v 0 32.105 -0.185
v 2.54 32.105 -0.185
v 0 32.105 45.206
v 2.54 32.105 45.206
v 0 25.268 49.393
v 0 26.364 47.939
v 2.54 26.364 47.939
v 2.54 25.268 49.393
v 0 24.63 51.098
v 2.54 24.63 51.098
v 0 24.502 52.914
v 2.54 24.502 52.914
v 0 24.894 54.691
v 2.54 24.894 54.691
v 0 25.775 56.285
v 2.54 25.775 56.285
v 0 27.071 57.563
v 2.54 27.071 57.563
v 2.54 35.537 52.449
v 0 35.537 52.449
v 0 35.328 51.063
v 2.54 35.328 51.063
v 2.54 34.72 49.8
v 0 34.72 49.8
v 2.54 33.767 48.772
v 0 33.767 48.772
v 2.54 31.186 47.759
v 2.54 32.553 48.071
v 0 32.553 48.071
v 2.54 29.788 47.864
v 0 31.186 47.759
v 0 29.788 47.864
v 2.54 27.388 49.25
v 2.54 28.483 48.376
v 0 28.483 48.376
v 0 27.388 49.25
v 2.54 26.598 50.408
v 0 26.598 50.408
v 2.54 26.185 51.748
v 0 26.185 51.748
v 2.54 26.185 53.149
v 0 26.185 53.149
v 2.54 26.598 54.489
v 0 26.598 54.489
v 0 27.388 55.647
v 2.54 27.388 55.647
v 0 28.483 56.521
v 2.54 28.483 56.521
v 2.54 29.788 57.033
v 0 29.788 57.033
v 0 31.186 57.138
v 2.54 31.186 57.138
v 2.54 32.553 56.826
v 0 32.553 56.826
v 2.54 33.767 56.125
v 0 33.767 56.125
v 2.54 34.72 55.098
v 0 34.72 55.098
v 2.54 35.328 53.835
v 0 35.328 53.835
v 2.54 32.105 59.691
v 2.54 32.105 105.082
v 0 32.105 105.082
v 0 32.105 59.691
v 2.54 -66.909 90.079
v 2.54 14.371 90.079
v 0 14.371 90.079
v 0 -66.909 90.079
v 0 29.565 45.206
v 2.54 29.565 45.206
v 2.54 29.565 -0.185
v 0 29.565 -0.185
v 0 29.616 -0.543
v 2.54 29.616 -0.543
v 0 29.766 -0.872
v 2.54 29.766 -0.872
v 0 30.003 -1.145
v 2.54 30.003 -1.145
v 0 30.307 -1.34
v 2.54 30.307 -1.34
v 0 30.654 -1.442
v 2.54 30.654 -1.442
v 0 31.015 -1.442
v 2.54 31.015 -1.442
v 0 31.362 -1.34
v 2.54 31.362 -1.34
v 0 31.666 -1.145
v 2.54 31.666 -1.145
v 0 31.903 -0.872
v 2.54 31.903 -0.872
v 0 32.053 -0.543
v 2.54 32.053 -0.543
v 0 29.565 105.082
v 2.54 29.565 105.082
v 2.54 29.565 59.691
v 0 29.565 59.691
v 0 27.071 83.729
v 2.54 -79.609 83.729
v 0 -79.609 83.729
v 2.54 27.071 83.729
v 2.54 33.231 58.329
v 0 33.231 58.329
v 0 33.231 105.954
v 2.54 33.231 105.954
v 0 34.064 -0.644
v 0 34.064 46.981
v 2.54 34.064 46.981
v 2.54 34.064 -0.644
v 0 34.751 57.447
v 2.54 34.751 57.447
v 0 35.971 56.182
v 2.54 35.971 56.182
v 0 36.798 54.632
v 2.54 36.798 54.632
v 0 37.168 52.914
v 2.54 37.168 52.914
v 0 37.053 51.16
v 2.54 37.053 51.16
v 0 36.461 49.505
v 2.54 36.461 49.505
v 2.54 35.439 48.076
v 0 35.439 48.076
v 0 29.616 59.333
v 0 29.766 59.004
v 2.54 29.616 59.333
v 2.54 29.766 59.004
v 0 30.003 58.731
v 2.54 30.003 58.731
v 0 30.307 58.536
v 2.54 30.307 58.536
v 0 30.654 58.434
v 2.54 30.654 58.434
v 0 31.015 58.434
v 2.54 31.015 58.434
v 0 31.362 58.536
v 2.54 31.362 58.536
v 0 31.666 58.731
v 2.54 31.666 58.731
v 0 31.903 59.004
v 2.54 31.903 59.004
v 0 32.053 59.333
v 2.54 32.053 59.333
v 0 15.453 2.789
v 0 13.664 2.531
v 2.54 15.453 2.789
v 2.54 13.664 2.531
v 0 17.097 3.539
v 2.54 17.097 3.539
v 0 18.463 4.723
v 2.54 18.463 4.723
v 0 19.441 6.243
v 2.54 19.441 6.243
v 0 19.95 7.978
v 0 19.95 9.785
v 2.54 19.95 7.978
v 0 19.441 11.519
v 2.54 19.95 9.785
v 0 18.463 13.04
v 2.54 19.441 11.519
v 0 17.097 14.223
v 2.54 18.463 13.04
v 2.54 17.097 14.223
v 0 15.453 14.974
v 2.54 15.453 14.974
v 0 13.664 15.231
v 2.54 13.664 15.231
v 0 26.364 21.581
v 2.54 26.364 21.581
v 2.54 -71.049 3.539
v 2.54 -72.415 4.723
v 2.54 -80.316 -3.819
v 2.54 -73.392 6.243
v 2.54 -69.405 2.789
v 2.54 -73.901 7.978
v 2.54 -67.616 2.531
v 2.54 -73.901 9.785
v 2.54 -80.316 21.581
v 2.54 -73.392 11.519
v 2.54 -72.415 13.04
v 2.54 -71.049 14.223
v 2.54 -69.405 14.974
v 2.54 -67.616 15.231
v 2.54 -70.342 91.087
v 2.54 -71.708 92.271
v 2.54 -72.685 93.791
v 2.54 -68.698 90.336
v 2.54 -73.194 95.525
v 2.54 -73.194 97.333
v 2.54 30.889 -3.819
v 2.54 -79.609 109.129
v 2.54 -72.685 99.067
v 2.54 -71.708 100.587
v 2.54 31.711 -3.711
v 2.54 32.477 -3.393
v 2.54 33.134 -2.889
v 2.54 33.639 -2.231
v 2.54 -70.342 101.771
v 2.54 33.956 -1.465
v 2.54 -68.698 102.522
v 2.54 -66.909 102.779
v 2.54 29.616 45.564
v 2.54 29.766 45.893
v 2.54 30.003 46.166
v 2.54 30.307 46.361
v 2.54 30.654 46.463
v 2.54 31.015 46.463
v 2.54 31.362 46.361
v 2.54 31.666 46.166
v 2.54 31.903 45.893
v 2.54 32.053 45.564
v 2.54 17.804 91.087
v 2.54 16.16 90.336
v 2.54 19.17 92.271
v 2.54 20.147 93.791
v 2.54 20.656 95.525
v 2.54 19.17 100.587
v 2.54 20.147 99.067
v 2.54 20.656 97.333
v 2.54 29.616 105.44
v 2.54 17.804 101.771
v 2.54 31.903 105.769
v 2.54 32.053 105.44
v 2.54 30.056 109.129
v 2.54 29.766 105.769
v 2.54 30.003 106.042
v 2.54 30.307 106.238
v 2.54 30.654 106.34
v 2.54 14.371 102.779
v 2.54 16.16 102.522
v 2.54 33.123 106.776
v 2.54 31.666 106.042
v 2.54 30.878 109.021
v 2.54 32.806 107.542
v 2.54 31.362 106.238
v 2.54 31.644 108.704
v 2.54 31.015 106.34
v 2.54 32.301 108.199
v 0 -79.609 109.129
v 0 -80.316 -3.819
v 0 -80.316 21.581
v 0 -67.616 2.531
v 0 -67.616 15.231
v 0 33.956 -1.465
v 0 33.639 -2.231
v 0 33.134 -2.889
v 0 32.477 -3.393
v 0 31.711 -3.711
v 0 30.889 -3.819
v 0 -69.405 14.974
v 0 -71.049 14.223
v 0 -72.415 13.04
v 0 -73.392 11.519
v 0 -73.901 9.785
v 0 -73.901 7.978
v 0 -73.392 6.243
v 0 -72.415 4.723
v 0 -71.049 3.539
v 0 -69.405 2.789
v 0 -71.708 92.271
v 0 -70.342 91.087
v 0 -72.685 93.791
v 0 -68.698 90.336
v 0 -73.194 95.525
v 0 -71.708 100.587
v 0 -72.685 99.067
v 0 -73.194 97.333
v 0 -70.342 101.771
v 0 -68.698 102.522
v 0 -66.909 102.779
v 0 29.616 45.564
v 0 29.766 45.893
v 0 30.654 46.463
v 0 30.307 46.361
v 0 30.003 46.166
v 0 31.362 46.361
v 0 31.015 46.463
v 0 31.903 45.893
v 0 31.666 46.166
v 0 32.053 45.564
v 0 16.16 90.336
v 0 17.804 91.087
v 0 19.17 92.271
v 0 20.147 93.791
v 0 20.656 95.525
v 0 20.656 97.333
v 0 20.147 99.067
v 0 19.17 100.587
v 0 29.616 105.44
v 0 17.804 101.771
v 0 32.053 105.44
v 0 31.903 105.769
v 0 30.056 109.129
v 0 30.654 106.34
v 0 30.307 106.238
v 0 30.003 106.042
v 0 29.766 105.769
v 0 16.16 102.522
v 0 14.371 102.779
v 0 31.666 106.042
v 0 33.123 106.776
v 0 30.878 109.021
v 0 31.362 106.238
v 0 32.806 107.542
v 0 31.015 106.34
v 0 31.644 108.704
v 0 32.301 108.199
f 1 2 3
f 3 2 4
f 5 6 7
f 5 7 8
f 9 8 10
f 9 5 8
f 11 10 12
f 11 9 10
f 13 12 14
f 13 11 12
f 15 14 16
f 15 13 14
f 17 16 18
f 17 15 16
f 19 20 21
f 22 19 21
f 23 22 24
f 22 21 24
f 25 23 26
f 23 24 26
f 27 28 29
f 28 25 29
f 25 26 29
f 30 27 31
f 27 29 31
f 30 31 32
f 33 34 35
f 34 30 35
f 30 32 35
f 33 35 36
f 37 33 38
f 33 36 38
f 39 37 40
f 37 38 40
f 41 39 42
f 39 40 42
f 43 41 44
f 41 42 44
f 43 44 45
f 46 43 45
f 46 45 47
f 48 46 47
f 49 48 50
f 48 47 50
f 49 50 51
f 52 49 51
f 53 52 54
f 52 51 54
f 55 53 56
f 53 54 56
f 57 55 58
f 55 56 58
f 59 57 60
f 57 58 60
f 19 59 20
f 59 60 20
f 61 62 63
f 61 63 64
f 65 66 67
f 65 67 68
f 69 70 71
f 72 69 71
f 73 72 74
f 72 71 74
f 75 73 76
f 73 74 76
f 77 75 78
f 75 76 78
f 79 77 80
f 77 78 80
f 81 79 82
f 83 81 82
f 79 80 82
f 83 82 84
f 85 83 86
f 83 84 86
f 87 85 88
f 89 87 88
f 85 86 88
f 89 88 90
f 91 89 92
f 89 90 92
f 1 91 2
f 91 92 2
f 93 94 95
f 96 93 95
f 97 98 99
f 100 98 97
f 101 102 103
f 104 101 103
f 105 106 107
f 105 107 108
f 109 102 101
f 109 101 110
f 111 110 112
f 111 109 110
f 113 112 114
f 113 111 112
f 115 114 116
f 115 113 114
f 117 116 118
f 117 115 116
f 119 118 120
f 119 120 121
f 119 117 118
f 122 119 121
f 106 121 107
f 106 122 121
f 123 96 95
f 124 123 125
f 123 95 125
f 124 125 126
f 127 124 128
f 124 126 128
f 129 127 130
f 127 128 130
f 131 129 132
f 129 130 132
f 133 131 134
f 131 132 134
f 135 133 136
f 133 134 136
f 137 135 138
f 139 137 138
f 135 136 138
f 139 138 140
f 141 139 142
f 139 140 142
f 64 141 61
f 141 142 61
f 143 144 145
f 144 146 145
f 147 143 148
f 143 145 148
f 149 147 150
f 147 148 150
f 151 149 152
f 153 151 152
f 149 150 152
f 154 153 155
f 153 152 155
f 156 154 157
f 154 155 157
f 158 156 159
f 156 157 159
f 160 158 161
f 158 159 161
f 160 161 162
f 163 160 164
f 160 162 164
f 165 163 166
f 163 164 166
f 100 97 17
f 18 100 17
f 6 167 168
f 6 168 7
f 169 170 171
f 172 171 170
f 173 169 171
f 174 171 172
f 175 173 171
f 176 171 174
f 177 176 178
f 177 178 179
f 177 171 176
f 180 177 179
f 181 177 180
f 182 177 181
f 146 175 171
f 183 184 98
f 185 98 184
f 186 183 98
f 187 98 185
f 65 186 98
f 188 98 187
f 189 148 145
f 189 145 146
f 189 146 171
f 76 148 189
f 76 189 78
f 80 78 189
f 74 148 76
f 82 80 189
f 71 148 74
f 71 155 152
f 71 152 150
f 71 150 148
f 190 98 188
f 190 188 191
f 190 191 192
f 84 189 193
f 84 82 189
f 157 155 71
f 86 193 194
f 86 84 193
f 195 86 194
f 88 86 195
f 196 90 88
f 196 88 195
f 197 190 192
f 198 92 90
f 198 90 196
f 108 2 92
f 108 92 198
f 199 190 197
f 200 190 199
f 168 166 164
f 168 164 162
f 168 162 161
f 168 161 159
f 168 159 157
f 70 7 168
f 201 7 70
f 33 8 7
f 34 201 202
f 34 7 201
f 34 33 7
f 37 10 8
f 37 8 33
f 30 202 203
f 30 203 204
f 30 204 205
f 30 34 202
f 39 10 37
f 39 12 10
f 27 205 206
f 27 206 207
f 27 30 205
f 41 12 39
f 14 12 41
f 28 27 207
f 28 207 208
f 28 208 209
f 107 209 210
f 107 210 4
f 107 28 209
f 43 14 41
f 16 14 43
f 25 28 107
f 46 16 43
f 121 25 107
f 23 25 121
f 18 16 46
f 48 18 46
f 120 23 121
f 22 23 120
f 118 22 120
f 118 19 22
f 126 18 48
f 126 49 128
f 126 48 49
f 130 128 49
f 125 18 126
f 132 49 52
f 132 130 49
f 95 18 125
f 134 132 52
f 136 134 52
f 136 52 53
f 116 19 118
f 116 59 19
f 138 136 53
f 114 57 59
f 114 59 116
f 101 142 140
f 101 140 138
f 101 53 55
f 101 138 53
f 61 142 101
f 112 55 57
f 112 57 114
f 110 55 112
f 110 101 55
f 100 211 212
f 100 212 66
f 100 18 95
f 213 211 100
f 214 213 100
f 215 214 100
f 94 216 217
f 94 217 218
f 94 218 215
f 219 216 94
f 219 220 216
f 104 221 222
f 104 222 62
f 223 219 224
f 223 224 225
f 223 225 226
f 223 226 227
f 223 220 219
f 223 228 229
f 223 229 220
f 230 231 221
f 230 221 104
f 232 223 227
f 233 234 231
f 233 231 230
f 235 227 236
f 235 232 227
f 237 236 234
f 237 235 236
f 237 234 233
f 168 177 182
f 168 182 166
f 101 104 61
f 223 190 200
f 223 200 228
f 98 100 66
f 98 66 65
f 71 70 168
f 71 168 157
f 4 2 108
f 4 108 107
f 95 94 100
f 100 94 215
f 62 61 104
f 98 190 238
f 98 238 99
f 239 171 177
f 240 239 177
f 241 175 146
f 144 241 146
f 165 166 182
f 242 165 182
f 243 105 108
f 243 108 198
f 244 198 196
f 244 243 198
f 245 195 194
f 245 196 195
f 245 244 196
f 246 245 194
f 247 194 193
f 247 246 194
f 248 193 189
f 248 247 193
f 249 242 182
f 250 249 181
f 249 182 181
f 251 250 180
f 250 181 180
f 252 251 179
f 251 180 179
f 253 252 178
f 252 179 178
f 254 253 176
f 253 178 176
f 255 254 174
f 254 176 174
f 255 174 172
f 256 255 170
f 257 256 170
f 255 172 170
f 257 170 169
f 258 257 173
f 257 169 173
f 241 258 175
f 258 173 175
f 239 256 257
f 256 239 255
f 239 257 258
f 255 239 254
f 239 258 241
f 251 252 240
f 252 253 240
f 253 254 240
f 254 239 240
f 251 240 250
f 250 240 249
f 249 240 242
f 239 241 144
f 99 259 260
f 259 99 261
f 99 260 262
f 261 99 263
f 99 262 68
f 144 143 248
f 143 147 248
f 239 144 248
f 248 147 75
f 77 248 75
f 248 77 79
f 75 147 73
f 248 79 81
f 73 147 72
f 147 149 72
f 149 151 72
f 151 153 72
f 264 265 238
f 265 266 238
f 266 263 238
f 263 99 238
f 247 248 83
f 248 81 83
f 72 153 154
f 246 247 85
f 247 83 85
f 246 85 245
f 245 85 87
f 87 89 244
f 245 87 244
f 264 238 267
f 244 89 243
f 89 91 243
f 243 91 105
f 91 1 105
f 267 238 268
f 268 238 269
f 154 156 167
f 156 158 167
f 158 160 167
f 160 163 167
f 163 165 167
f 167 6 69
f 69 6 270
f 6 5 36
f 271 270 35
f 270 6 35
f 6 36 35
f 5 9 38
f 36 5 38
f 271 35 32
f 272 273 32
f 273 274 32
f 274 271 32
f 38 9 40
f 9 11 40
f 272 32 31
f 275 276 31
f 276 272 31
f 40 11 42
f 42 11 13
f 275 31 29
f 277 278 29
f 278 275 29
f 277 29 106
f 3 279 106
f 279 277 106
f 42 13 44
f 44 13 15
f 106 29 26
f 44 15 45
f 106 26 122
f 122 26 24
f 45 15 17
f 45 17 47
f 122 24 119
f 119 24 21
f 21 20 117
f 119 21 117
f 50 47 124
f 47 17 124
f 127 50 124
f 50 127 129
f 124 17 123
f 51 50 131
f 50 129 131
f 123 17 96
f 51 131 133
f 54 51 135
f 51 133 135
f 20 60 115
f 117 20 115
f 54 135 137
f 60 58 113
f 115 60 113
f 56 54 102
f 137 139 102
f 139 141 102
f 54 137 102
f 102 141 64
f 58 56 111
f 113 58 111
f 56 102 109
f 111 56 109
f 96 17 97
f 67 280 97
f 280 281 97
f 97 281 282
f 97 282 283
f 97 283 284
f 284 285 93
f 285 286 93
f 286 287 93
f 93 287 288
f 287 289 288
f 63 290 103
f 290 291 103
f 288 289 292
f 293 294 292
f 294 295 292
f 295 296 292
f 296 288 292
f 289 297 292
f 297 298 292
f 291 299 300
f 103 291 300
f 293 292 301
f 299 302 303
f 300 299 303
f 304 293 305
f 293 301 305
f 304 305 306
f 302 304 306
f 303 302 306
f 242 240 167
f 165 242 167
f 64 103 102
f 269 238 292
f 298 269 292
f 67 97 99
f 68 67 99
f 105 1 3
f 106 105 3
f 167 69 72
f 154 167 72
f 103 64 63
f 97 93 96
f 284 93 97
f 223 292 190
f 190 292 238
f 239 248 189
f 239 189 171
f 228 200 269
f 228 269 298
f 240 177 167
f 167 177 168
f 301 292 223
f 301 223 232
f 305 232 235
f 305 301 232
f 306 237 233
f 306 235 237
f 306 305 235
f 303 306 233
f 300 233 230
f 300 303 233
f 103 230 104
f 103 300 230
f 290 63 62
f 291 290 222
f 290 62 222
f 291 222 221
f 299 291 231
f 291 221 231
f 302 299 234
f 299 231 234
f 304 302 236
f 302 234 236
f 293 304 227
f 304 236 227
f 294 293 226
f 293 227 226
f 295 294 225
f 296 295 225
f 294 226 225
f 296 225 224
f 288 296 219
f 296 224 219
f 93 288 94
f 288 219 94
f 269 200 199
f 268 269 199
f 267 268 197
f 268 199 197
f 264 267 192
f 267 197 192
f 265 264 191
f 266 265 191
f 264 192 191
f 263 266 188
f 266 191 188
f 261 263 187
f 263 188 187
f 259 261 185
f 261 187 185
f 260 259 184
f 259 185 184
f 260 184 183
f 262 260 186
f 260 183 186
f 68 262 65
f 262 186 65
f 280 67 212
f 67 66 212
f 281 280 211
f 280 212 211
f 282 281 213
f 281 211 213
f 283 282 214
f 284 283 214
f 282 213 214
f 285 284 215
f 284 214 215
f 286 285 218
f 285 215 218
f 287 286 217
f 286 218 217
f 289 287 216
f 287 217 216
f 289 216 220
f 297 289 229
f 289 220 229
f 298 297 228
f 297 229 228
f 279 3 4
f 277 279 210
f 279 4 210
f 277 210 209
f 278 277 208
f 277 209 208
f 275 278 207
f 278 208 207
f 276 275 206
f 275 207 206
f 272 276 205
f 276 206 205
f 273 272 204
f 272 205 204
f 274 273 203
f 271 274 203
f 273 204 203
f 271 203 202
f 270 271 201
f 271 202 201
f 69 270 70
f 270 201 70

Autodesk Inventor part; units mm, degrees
ref_plane "YZ Plane" through (0, 0, 0) normal (1, 0, 0) x (0, 1, 0)
ref_plane "XZ Plane" through (0, 0, 0) normal (0, 1, 0) x (-1, 0, 0)
ref_plane "XY Plane" through (0, 0, 0) normal (0, 0, 1) x (1, 0, 0)
sketch "Sketch1" plane through (0, 0, 0) normal (1, 0, 0) x (0, 1, 0)
  circle A0 centre (30.8347, 52.4486) radius 6.35
  line L0 (34.0644, 46.9813) -> (34.0644, -0.6437)
  line L1 (33.2311, 58.3291) -> (33.2311, 105.9541)
  line L2 (30.0561, 109.1291) -> (27.0711, 109.1291)
  arc A1 (33.2311, 105.9541) -> (30.0561, 109.1291) centre (30.0561, 105.9541) ccw
  line L3 (30.8894, -3.8187) -> (26.3644, -3.8187)
  arc A2 (30.8894, -3.8187) -> (34.0644, -0.6437) centre (30.8894, -0.6437) ccw
  line L4 (27.0711, 109.1291) -> (27.0711, 57.5631)
  line L5 (26.3644, -3.8187) -> (26.3644, 47.9388)
  line L6 (27.0711, 109.1291) -> (27.0711, 83.7291)
  line L7 (27.0711, 109.1291) -> (-79.6089, 109.1291)
  line L8 (-79.6089, 109.1291) -> (-79.6089, 83.7291)
  line L9 (-79.6089, 83.7291) -> (27.0711, 83.7291)
  line L10 (26.3644, -3.8187) -> (-80.3156, -3.8187)
  line L11 (-80.3156, -3.8187) -> (-80.3156, 21.5813)
  line L12 (26.3644, -3.8187) -> (26.3644, 21.5813)
  line L13 (26.3644, 21.5813) -> (-80.3156, 21.5813)
  circle A3 centre (30.8347, 52.4486) radius 4.7025
  point P0 (34.0644, -3.8187)
  point P1 (33.2311, 109.1291)
  dimension "d3" = 50.8
  dimension "d4" = 50.8
  dimension "d5" = 6.16
  dimension "d6" = 3.175
  dimension "d7" = 3.175
  dimension "d8" = 25.4
  dimension "d9" = 106.68
  dimension "d10" = 106.68
  dimension "d11" = 25.4
  dimension "d13" = 25.4
  dimension "d46" = 12.7
extrude "Extrusion1" add sketch "Sketch1" along normal blind 2.54 contours A0 | A0 L4 L2 A1 L1 | L0 A2 L3 L5 A0
sketch "Sketch2" plane through (2.54, 0, 0) normal (1, 0, 0) x (0, 0, -1)
  line L0 (-109.1291, 27.0711) -> (-57.5631, 27.0711) projected
  line L1 (-109.1291, 27.0711) -> (-109.1291, -79.6089)
  line L2 (-109.1291, -79.6089) -> (-83.7291, -79.6089)
  line L3 (-83.7291, -79.6089) -> (-83.7291, 27.0711)
  line L4 (-109.1291, 27.0711) -> (-83.7291, 27.0711)
  line L5 (3.8187, 26.3644) -> (3.8187, 30.8894) projected
  line L6 (3.8187, 26.3644) -> (3.8187, -80.3156)
  line L7 (3.8187, -80.3156) -> (-21.5813, -80.3156)
  line L8 (-21.5813, -80.3156) -> (-21.5813, 26.3644)
  line L9 (-47.9388, 26.3644) -> (3.8187, 26.3644) projected
  point P0 (0, 0)
  dimension "d16" = 106.68
  dimension "d17" = 25.4
  dimension "d18" = 106.68
  dimension "d19" = 25.4
extrude "Extrusion2" add sketch "Sketch2" against normal up to surface (2.54 mm away)
sketch "Sketch3" plane through (2.54, 0, 0) normal (1, 0, 0) x (0, 0, -1)
  line L0 (-83.7291, -79.6089) -> (-83.7291, 27.0711) projected
  line L1 (-58.3291, 33.2311) -> (-105.9541, 33.2311) projected
  line L2 (-109.1291, 30.0561) -> (-109.1291, -79.6089) projected
  line L3 (-109.1291, -79.6089) -> (-83.7291, -79.6089) projected
  line L4 (-96.4291, 20.7211) -> (-96.4291, 20.7211)
  line L5 (-90.0791, 14.3711) -> (-90.0791, -66.9089)
  line L6 (-96.4291, -73.2589) -> (-96.4291, -73.2589)
  line L7 (-102.7791, -66.9089) -> (-102.7791, 14.3711)
  arc A0 (-96.4291, 20.7211) -> (-102.7791, 14.3711) centre (-96.4291, 14.3711) ccw
  arc A1 (-90.0791, 14.3711) -> (-96.4291, 20.7211) centre (-96.4291, 14.3711) ccw
  arc A2 (-102.7791, -66.9089) -> (-96.4291, -73.2589) centre (-96.4291, -66.9089) ccw
  arc A3 (-96.4291, -73.2589) -> (-90.0791, -66.9089) centre (-96.4291, -66.9089) ccw
  line L8 (-8.8813, 20.0144) -> (-8.8813, 20.0144)
  line L9 (-15.2313, 13.6644) -> (-15.2313, -67.6156)
  line L10 (-8.8813, -73.9656) -> (-8.8813, -73.9656)
  line L11 (-2.5313, -67.6156) -> (-2.5313, 13.6644)
  line L12 (-21.5813, -80.3156) -> (3.8187, -80.3156) projected
  line L13 (-47.9388, 26.3644) -> (-21.5813, 26.3644) projected
  line L14 (3.8187, -80.3156) -> (3.8187, 30.8894) projected
  line L15 (-21.5813, 26.3644) -> (-21.5813, -80.3156) projected
  arc A4 (-8.8813, 20.0144) -> (-15.2313, 13.6644) centre (-8.8813, 13.6644) ccw
  arc A5 (-2.5313, 13.6644) -> (-8.8813, 20.0144) centre (-8.8813, 13.6644) ccw
  arc A6 (-15.2313, -67.6156) -> (-8.8813, -73.9656) centre (-8.8813, -67.6156) ccw
  arc A7 (-8.8813, -73.9656) -> (-2.5313, -67.6156) centre (-8.8813, -67.6156) ccw
  circle A8 centre (-52.4486, 30.8347) radius 4.7025 projected
  line L16 (-57.1511, 30.8347) -> (-59.6911, 30.8347)
  arc A9 (-59.6911, 29.5647) -> (-59.6911, 32.1047) centre (-59.6911, 30.8347) ccw
  line L17 (-107.6225, 30.8347) -> (-105.0825, 30.8347)
  arc A10 (-105.0825, 32.1047) -> (-105.0825, 29.5647) centre (-105.0825, 30.8347) ccw
  line L18 (-105.0825, 32.1047) -> (-59.6911, 32.1047)
  line L19 (-105.0825, 29.5647) -> (-59.6911, 29.5647)
  line L20 (-47.7461, 30.8347) -> (-45.2061, 30.8347)
  arc A11 (-45.2061, 32.1047) -> (-45.2061, 29.5647) centre (-45.2061, 30.8347) ccw
  arc A12 (0.1852, 29.5647) -> (0.1852, 32.1047) centre (0.1852, 30.8347) ccw
  line L21 (0.1852, 32.1047) -> (-45.2061, 32.1047)
  line L22 (-45.2061, 29.5647) -> (0.1852, 29.5647)
  point P0 (0, 0)
  point P1 (-8.8813, 20.0144)
  point P2 (-8.8813, -73.9656)
  dimension "d26" = 6.35
  dimension "d27" = 6.35
  dimension "d28" = 6.35
  dimension "d29" = 6.35
  dimension "d30" = 6.35
  dimension "d31" = 6.35
  dimension "d32" = 6.35
  dimension "d33" = 6.35
  dimension "d34" = 6.35
  dimension "d35" = 6.35
  dimension "d36" = 2.54
  dimension "d37" = 2.54
  dimension "d38" = 2.54
  dimension "d39" = 2.54
  dimension "d40" = 2.54
  dimension "d41" = 2.54
  dimension "d43" = 2.54
extrude "Extrusion3" cut sketch "Sketch3" against normal through all contours L5 A3 A2 L7 A0 A1 | A4 A5 L11 A7 A6 L9 | L19 A10 L18 A9 | L21 A12 L22 A11
properties part number "Monitor Part ReDes"
